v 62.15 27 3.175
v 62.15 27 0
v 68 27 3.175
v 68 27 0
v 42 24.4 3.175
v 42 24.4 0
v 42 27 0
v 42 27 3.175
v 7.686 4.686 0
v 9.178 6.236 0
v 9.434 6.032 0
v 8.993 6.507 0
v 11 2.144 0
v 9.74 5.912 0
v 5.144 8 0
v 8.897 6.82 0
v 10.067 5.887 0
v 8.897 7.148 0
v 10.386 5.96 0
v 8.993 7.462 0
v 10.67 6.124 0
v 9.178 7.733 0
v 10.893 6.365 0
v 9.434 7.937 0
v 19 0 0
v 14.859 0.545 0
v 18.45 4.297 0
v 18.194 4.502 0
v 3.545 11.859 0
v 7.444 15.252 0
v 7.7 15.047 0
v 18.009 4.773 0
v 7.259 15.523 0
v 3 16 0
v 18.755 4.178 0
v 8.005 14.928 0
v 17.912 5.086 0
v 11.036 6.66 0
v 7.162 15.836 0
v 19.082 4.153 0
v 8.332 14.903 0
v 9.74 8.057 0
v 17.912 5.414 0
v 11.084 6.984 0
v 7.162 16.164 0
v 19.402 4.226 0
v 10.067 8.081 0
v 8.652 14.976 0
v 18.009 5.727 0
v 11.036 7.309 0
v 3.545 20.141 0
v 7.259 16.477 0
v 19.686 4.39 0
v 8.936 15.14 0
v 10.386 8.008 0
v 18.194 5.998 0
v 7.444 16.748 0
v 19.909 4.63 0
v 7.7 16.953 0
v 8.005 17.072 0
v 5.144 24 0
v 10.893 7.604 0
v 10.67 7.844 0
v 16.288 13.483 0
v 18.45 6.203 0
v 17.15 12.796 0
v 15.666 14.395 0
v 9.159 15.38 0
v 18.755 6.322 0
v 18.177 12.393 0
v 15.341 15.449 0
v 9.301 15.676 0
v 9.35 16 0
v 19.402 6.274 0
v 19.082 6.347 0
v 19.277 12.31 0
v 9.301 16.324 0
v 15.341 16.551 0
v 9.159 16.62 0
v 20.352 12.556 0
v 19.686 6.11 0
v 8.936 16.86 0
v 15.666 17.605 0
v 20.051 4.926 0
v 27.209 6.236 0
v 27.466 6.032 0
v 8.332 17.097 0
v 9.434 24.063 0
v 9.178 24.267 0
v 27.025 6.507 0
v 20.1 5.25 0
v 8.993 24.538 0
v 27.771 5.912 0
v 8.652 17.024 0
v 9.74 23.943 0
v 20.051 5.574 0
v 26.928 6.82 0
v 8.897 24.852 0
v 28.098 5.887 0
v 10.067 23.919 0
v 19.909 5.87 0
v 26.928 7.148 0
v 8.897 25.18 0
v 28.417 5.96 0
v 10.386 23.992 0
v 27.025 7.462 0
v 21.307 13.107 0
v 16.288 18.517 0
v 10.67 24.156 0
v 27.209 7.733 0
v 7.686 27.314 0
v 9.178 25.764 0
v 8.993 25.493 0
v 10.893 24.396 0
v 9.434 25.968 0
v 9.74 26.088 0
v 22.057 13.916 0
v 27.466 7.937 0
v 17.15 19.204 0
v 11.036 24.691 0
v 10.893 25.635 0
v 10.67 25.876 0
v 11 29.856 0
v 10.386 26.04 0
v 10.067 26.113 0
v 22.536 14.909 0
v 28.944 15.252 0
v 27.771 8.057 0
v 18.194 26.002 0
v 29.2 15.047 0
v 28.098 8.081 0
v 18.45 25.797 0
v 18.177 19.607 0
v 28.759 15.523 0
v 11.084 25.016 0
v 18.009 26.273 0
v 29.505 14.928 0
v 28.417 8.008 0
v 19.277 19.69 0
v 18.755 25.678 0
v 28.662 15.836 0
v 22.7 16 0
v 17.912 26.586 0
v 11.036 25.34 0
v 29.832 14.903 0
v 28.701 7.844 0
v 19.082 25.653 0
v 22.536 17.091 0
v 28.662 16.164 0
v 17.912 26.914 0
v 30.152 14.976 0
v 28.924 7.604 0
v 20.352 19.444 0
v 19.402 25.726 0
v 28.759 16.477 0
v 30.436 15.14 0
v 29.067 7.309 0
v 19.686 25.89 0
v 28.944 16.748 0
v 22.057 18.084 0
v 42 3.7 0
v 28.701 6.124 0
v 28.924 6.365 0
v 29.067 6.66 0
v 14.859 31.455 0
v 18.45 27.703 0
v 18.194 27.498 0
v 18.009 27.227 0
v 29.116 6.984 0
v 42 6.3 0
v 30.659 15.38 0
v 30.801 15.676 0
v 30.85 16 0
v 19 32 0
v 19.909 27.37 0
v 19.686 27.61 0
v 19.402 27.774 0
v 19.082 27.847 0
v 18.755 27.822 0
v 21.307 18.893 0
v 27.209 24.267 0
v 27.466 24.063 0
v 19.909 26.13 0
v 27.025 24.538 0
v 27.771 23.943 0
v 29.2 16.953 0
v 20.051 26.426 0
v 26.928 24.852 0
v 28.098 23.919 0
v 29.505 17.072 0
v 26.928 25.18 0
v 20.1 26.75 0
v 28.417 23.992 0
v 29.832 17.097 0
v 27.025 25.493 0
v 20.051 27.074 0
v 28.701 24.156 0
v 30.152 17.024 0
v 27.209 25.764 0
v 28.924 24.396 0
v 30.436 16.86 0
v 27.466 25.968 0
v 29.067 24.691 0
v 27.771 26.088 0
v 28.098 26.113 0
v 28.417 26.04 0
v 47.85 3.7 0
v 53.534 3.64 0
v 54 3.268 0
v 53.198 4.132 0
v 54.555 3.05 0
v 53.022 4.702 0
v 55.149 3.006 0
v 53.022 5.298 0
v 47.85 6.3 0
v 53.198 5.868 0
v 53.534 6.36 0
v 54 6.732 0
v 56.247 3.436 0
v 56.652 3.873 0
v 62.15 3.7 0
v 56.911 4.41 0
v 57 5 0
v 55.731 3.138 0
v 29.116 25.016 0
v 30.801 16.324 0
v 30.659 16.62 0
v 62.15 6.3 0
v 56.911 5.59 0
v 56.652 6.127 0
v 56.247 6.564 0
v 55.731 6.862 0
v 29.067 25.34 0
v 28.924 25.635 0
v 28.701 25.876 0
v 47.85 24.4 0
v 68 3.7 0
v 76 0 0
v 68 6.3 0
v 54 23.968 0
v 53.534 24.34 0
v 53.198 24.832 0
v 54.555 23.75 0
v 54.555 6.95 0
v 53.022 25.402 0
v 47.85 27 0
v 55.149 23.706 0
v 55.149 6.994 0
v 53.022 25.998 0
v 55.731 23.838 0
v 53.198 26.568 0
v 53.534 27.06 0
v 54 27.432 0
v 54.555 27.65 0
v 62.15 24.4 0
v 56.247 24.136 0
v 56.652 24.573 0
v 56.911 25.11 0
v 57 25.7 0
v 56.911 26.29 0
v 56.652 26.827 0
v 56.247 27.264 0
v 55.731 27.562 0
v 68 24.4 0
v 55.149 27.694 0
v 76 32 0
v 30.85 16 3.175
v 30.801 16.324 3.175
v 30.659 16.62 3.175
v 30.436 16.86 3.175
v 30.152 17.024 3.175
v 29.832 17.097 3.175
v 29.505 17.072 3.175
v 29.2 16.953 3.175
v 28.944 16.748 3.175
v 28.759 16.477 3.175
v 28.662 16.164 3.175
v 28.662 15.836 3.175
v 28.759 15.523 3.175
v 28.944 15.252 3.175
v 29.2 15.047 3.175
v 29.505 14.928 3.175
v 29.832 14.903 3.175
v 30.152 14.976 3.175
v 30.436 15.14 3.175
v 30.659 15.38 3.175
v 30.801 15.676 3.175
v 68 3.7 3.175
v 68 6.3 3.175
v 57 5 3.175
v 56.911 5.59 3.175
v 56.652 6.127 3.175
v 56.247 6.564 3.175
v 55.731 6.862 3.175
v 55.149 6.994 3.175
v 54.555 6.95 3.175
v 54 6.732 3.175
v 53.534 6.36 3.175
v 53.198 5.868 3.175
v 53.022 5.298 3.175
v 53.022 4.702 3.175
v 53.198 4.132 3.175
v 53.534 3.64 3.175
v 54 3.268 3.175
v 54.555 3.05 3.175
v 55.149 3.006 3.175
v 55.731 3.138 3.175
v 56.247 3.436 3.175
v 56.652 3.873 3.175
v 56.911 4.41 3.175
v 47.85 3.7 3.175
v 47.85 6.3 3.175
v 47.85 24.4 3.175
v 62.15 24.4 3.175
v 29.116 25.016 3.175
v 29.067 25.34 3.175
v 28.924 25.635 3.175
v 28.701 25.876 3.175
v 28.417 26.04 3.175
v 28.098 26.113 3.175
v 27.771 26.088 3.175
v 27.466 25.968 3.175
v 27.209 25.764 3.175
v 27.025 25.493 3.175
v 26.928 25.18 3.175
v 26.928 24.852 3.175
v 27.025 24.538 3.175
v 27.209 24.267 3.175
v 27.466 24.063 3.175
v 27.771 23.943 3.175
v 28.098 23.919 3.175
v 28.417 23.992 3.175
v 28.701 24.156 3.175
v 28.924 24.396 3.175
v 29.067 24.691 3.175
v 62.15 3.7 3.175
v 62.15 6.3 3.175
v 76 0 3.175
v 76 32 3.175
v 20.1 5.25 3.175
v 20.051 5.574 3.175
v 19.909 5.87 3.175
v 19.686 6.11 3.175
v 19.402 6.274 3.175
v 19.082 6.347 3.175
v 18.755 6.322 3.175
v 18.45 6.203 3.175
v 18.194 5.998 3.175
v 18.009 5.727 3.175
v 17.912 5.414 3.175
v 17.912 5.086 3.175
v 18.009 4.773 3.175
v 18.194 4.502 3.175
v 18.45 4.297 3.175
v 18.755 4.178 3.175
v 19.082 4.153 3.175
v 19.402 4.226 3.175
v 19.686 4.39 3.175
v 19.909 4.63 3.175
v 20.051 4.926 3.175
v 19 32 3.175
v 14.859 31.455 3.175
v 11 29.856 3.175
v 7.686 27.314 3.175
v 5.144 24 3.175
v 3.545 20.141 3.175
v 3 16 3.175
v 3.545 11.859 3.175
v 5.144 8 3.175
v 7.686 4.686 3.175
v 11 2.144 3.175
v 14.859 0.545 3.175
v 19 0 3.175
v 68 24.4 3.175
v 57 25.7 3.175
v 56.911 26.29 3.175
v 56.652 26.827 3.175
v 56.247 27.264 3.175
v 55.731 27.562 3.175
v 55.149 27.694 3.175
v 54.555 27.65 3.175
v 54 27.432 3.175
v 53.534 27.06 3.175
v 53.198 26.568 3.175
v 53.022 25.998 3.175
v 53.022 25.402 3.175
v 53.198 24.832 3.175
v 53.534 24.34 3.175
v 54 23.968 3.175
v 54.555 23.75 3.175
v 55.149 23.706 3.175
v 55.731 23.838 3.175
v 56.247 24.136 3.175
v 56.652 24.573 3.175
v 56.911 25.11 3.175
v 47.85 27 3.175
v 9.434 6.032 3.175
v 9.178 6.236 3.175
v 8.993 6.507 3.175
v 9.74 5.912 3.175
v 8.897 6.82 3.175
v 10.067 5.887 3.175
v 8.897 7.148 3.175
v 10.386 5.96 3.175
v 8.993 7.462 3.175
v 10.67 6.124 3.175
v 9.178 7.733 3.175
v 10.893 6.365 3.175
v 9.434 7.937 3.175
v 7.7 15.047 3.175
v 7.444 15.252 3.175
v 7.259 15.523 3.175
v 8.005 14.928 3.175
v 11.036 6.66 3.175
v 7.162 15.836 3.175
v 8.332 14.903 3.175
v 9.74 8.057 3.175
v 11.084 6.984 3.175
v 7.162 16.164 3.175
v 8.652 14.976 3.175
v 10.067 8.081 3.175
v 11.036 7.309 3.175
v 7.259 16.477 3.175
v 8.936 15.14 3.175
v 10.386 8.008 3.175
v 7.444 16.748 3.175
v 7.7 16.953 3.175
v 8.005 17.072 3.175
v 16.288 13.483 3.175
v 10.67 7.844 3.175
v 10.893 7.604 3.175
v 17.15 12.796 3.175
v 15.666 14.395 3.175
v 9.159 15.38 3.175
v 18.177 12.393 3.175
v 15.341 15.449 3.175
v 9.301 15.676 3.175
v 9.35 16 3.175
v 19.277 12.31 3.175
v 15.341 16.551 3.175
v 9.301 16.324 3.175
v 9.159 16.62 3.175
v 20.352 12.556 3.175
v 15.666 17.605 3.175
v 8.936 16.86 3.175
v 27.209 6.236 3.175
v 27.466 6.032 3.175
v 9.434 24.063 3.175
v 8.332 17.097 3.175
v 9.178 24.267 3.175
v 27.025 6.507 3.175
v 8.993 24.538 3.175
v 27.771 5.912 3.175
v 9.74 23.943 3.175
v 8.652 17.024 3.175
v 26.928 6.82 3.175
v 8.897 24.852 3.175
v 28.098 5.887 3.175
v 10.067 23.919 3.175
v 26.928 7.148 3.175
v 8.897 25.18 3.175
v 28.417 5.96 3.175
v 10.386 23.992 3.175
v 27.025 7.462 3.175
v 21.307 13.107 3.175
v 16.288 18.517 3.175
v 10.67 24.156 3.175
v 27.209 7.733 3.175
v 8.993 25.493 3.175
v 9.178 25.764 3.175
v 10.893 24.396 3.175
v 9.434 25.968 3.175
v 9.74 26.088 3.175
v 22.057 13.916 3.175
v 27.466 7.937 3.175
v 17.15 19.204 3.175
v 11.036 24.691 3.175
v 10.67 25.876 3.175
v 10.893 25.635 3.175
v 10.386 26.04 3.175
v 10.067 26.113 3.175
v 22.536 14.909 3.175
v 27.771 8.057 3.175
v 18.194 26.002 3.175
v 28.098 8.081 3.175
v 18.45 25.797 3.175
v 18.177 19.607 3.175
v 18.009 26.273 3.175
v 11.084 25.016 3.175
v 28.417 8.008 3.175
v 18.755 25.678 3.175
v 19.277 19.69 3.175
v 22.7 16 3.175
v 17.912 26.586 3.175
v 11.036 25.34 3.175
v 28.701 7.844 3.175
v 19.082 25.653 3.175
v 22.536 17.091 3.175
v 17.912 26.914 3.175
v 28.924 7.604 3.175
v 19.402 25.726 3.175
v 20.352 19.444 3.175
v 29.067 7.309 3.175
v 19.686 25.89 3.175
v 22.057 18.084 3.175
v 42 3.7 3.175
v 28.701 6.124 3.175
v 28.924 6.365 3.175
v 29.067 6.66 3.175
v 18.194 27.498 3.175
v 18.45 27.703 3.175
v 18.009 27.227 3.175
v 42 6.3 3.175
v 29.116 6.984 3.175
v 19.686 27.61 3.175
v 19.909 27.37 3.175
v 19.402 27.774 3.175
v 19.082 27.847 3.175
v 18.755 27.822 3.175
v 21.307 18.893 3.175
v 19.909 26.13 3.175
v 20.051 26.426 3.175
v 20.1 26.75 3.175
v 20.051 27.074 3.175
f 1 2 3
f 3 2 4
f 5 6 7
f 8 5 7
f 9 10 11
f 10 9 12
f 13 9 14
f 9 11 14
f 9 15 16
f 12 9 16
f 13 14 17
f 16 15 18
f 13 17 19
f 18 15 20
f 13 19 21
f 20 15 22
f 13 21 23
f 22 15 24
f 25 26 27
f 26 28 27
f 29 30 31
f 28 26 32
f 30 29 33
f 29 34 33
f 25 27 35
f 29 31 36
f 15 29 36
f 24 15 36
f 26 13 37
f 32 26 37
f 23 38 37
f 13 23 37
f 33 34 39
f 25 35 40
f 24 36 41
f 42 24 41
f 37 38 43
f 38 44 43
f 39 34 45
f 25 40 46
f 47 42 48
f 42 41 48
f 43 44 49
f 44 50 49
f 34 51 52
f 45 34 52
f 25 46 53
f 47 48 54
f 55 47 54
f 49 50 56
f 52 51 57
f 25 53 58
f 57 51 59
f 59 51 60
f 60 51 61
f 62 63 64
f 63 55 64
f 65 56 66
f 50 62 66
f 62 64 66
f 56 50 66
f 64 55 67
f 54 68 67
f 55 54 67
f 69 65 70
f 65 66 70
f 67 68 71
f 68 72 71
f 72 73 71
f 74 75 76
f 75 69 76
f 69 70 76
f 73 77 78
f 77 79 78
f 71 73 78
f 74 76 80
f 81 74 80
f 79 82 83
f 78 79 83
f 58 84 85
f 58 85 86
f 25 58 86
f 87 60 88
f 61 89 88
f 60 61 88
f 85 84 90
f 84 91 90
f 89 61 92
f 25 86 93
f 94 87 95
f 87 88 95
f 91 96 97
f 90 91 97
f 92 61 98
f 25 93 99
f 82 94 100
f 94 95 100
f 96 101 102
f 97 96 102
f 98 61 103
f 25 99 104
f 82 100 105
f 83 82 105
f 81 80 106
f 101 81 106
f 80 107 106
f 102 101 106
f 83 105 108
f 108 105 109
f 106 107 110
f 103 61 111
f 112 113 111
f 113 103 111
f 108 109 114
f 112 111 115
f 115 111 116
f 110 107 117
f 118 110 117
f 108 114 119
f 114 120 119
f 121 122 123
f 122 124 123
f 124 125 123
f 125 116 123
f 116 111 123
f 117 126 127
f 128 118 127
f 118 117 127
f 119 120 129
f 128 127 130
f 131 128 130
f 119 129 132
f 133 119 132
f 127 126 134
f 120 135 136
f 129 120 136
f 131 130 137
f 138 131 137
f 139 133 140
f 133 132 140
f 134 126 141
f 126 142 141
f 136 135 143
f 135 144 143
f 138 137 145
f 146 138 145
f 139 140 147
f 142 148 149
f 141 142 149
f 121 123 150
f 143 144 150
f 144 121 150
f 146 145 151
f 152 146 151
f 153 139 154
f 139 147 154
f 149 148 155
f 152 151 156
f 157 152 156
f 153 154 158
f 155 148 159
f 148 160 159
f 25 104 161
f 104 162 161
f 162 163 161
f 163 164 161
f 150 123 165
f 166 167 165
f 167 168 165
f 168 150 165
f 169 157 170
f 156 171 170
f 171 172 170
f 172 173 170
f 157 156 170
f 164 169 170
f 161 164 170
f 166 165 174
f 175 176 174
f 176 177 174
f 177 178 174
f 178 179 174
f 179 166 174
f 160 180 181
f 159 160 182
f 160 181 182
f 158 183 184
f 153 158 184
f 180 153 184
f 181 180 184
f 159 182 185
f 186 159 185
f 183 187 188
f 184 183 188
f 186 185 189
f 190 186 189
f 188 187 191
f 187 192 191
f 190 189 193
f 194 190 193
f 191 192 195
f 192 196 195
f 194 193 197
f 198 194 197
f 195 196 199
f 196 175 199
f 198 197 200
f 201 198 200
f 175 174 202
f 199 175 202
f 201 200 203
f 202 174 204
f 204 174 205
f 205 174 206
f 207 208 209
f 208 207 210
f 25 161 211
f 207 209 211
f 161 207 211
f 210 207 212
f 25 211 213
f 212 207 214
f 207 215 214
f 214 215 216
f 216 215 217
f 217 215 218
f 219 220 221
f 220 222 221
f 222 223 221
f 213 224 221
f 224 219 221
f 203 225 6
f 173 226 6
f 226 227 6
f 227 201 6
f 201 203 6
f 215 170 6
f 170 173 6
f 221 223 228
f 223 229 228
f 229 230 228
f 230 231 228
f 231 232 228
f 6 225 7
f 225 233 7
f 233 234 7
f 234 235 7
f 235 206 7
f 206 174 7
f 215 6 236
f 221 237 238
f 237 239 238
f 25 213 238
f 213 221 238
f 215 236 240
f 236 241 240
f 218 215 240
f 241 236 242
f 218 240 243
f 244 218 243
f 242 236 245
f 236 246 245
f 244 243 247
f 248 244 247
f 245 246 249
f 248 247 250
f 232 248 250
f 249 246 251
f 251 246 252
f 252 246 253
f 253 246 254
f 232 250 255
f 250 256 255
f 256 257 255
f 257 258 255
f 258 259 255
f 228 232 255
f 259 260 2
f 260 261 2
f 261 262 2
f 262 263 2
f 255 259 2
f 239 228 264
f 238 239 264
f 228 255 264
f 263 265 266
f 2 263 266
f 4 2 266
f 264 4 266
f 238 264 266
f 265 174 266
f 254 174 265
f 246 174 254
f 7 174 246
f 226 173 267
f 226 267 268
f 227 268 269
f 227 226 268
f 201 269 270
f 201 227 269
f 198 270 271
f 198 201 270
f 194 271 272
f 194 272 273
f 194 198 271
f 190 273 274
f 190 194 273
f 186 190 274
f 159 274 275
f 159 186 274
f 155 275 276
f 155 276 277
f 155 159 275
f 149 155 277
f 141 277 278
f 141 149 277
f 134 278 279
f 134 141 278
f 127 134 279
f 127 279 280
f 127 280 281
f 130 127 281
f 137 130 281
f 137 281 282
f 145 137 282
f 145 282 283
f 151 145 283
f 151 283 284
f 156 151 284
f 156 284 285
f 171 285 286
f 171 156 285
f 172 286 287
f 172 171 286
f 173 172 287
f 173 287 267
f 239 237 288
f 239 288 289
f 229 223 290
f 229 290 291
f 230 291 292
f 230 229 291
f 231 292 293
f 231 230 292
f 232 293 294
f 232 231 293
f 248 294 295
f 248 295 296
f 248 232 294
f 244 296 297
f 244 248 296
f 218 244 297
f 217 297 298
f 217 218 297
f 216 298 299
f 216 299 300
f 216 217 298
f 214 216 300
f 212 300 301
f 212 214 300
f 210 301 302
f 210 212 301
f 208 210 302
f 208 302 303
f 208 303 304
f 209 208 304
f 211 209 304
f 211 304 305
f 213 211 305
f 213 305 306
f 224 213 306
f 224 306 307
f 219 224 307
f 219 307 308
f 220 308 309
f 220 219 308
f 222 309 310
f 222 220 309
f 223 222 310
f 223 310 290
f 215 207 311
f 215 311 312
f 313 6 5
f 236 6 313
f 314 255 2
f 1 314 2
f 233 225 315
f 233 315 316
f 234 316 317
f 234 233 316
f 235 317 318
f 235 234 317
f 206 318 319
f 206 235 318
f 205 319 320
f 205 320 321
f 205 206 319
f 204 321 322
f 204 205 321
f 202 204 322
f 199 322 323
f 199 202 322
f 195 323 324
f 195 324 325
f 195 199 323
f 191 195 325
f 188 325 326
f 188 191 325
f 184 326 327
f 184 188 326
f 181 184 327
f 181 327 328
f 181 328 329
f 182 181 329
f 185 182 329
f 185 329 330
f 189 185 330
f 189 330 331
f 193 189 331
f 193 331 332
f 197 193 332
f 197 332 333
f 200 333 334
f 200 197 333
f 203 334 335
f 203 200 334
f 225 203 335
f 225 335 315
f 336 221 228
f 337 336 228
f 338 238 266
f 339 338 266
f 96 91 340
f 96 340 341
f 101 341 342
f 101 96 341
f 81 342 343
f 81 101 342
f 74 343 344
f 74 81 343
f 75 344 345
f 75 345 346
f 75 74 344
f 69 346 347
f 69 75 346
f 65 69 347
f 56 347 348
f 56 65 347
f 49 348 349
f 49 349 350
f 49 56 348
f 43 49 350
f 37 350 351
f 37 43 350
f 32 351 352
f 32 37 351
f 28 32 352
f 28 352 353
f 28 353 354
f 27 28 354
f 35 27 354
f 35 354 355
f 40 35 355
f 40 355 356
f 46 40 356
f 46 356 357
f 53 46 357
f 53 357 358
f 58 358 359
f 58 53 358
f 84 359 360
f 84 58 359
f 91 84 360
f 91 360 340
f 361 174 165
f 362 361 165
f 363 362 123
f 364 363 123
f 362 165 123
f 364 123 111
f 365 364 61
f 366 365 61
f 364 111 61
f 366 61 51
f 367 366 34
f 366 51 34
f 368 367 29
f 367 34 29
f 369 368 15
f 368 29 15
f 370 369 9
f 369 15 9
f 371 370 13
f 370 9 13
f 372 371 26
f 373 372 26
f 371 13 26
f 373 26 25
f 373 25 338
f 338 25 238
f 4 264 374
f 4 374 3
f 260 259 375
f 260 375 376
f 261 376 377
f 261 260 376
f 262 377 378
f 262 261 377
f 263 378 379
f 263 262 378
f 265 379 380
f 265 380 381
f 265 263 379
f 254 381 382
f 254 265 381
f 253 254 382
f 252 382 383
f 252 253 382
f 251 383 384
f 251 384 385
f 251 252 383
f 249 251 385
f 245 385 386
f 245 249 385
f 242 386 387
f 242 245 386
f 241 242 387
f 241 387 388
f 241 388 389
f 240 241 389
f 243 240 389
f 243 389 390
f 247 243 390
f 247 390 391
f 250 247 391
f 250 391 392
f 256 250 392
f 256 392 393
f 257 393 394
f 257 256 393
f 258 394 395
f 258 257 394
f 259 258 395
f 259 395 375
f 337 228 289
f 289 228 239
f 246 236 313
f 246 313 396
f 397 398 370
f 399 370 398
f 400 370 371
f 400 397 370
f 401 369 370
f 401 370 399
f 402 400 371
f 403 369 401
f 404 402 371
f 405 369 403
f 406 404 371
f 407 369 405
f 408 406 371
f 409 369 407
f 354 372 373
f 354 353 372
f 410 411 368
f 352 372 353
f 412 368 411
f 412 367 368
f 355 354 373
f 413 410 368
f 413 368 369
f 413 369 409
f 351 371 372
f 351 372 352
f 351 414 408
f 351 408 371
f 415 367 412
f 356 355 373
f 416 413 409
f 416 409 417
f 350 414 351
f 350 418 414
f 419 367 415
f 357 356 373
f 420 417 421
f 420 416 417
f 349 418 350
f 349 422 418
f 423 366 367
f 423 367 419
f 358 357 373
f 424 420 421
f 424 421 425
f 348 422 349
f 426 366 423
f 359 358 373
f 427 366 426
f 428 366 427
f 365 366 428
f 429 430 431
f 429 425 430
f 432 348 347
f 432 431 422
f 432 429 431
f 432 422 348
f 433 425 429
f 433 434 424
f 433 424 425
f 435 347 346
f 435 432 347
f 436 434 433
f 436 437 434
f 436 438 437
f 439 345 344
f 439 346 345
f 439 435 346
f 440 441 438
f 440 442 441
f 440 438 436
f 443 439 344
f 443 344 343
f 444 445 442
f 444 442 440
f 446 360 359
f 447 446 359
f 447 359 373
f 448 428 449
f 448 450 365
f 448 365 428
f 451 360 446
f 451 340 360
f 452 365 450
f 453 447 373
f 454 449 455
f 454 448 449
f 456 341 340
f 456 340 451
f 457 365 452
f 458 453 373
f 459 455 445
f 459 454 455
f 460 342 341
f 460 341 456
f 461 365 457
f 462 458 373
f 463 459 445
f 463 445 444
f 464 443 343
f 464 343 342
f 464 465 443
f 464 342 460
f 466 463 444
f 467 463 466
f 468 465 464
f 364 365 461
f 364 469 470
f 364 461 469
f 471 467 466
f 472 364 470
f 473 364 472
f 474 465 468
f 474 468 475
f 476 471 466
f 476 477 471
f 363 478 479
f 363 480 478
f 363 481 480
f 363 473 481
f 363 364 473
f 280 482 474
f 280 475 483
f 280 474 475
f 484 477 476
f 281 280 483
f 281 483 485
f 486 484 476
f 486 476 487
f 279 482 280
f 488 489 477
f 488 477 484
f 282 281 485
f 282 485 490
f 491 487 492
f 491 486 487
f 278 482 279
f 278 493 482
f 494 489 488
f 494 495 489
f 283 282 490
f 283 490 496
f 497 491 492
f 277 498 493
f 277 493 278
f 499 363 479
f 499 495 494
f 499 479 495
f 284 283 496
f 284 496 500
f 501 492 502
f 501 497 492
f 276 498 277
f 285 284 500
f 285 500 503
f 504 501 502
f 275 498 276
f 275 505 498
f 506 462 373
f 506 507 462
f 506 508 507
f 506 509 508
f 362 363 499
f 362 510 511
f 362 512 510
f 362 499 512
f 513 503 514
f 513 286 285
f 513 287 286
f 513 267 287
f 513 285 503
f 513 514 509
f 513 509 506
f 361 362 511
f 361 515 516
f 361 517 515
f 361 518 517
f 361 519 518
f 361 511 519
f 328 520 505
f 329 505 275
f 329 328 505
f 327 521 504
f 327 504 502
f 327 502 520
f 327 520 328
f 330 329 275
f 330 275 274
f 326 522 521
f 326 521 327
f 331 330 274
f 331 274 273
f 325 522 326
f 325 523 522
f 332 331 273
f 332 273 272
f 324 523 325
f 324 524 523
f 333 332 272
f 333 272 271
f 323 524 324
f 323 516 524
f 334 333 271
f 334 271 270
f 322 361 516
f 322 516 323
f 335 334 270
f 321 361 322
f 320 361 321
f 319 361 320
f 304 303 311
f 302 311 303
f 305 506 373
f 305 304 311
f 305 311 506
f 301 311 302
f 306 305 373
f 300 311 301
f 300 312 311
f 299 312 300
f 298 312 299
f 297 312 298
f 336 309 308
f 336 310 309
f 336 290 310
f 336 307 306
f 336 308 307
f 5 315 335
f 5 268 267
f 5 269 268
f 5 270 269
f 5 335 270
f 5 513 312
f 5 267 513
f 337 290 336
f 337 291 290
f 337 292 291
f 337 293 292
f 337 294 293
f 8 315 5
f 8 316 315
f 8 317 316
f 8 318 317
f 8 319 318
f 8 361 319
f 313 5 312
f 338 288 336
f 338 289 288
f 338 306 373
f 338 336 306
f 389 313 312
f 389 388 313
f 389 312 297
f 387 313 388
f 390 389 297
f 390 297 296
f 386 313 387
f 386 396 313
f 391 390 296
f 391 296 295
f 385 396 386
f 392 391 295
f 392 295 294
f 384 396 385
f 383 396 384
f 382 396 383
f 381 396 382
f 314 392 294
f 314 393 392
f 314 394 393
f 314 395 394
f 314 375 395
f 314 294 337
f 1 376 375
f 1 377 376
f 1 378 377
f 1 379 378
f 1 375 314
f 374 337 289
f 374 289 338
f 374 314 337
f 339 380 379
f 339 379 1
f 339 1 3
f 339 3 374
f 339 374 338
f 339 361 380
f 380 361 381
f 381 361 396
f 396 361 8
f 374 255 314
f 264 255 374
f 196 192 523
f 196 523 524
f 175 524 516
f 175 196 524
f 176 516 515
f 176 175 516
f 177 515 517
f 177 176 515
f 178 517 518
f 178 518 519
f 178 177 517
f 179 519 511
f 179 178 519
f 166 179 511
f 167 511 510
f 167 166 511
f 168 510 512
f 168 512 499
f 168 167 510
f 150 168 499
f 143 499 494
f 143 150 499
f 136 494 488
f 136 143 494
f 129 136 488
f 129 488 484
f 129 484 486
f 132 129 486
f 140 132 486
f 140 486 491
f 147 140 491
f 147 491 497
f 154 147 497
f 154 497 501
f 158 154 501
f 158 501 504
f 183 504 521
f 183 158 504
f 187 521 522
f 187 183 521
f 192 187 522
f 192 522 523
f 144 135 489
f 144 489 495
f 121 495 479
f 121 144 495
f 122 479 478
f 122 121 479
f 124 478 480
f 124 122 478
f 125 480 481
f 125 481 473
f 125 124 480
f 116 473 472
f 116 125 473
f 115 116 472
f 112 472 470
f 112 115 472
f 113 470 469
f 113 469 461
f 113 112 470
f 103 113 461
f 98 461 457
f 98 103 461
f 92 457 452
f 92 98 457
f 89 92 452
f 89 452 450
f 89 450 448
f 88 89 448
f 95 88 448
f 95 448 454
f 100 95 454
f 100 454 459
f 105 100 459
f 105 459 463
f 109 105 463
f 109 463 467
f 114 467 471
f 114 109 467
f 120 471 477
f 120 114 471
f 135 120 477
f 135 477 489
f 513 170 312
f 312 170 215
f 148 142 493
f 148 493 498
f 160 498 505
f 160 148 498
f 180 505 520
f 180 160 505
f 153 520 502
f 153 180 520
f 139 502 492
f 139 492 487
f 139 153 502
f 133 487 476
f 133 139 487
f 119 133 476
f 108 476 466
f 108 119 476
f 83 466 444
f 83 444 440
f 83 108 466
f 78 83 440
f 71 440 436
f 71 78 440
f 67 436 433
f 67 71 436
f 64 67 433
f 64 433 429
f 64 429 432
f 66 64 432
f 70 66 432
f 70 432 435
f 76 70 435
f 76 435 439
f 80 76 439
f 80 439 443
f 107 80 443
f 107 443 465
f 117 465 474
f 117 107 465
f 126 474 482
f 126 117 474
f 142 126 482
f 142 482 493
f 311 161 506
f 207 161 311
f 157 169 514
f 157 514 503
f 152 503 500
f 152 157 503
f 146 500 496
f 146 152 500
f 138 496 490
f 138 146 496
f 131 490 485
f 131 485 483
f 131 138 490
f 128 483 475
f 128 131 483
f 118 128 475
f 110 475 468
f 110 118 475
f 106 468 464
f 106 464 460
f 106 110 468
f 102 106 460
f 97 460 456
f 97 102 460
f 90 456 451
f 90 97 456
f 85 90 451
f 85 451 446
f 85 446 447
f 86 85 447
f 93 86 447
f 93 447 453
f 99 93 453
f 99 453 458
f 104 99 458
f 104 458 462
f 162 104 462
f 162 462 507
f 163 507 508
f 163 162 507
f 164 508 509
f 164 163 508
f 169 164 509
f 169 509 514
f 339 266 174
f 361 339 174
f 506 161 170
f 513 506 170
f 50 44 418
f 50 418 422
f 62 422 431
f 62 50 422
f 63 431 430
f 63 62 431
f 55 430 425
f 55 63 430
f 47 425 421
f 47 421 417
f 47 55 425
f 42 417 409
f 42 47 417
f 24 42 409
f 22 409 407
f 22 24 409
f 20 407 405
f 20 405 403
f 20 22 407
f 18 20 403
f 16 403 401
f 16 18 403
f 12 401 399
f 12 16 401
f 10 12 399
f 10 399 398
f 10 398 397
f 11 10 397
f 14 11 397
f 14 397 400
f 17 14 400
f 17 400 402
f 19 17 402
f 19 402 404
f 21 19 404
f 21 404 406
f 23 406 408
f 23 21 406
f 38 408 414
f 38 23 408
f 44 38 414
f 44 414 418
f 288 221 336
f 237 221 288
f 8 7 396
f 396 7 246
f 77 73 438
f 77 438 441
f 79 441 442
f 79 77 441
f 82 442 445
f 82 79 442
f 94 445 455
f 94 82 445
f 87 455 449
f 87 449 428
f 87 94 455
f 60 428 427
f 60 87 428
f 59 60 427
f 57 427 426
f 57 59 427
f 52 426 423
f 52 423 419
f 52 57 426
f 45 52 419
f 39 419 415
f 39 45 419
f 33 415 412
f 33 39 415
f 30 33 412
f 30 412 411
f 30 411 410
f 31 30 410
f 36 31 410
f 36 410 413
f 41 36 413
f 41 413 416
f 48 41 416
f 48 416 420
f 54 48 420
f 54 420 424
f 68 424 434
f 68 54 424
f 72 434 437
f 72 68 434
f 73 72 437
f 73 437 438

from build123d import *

# Parameters (mm, degrees)
SKETCH1_R           = 1.1
SKETCH1_R_2         = 3.7
SKETCH1_R_3         = 2
SKETCH1_W           = 5.85
SKETCH1_H           = 2.6
BOSS_EXTRUDE1_DEPTH = 3.175


with BuildPart() as part:
    # Sketch1 → Boss-Extrude1 (new body)
    with BuildSketch(Plane.XY):
        with BuildLine():
            Line((19, 0), (76, 0))
            Line((76, 0), (76, 32))
            Line((76, 32), (19, 32))
            ThreePointArc((19, 32), (3, 16), (19, 0))
        make_face()
        with Locations((8.25, 16)):
            Circle(SKETCH1_R, mode=Mode.SUBTRACT)
        with Locations((9.98438854, 25.01561146)):
            Circle(SKETCH1_R, mode=Mode.SUBTRACT)
        with Locations((28.01561146, 25.01561146)):
            Circle(SKETCH1_R, mode=Mode.SUBTRACT)
        with Locations((28.01561146, 6.98438854)):
            Circle(SKETCH1_R, mode=Mode.SUBTRACT)
        with Locations((9.98438854, 6.98438854)):
            Circle(SKETCH1_R, mode=Mode.SUBTRACT)
        with Locations((19, 26.75)):
            Circle(SKETCH1_R, mode=Mode.SUBTRACT)
        with Locations((29.75, 16)):
            Circle(SKETCH1_R, mode=Mode.SUBTRACT)
        with Locations((19, 5.25)):
            Circle(SKETCH1_R, mode=Mode.SUBTRACT)
        with Locations((19, 16)):
            Circle(SKETCH1_R_2, mode=Mode.SUBTRACT)
        with Locations((55, 5)):
            Circle(SKETCH1_R_3, mode=Mode.SUBTRACT)
        with Locations((55, 25.7)):
            Circle(SKETCH1_R_3, mode=Mode.SUBTRACT)
        with Locations((44.925, 25.7)):
            Rectangle(SKETCH1_W, SKETCH1_H, mode=Mode.SUBTRACT)
        with Locations((65.075, 25.7)):
            Rectangle(SKETCH1_W, SKETCH1_H, mode=Mode.SUBTRACT)
        with Locations((44.925, 5)):
            Rectangle(SKETCH1_W, SKETCH1_H, mode=Mode.SUBTRACT)
        with Locations((65.075, 5)):
            Rectangle(SKETCH1_W, SKETCH1_H, mode=Mode.SUBTRACT)
    extrude(amount=BOSS_EXTRUDE1_DEPTH)


solid = part.part
